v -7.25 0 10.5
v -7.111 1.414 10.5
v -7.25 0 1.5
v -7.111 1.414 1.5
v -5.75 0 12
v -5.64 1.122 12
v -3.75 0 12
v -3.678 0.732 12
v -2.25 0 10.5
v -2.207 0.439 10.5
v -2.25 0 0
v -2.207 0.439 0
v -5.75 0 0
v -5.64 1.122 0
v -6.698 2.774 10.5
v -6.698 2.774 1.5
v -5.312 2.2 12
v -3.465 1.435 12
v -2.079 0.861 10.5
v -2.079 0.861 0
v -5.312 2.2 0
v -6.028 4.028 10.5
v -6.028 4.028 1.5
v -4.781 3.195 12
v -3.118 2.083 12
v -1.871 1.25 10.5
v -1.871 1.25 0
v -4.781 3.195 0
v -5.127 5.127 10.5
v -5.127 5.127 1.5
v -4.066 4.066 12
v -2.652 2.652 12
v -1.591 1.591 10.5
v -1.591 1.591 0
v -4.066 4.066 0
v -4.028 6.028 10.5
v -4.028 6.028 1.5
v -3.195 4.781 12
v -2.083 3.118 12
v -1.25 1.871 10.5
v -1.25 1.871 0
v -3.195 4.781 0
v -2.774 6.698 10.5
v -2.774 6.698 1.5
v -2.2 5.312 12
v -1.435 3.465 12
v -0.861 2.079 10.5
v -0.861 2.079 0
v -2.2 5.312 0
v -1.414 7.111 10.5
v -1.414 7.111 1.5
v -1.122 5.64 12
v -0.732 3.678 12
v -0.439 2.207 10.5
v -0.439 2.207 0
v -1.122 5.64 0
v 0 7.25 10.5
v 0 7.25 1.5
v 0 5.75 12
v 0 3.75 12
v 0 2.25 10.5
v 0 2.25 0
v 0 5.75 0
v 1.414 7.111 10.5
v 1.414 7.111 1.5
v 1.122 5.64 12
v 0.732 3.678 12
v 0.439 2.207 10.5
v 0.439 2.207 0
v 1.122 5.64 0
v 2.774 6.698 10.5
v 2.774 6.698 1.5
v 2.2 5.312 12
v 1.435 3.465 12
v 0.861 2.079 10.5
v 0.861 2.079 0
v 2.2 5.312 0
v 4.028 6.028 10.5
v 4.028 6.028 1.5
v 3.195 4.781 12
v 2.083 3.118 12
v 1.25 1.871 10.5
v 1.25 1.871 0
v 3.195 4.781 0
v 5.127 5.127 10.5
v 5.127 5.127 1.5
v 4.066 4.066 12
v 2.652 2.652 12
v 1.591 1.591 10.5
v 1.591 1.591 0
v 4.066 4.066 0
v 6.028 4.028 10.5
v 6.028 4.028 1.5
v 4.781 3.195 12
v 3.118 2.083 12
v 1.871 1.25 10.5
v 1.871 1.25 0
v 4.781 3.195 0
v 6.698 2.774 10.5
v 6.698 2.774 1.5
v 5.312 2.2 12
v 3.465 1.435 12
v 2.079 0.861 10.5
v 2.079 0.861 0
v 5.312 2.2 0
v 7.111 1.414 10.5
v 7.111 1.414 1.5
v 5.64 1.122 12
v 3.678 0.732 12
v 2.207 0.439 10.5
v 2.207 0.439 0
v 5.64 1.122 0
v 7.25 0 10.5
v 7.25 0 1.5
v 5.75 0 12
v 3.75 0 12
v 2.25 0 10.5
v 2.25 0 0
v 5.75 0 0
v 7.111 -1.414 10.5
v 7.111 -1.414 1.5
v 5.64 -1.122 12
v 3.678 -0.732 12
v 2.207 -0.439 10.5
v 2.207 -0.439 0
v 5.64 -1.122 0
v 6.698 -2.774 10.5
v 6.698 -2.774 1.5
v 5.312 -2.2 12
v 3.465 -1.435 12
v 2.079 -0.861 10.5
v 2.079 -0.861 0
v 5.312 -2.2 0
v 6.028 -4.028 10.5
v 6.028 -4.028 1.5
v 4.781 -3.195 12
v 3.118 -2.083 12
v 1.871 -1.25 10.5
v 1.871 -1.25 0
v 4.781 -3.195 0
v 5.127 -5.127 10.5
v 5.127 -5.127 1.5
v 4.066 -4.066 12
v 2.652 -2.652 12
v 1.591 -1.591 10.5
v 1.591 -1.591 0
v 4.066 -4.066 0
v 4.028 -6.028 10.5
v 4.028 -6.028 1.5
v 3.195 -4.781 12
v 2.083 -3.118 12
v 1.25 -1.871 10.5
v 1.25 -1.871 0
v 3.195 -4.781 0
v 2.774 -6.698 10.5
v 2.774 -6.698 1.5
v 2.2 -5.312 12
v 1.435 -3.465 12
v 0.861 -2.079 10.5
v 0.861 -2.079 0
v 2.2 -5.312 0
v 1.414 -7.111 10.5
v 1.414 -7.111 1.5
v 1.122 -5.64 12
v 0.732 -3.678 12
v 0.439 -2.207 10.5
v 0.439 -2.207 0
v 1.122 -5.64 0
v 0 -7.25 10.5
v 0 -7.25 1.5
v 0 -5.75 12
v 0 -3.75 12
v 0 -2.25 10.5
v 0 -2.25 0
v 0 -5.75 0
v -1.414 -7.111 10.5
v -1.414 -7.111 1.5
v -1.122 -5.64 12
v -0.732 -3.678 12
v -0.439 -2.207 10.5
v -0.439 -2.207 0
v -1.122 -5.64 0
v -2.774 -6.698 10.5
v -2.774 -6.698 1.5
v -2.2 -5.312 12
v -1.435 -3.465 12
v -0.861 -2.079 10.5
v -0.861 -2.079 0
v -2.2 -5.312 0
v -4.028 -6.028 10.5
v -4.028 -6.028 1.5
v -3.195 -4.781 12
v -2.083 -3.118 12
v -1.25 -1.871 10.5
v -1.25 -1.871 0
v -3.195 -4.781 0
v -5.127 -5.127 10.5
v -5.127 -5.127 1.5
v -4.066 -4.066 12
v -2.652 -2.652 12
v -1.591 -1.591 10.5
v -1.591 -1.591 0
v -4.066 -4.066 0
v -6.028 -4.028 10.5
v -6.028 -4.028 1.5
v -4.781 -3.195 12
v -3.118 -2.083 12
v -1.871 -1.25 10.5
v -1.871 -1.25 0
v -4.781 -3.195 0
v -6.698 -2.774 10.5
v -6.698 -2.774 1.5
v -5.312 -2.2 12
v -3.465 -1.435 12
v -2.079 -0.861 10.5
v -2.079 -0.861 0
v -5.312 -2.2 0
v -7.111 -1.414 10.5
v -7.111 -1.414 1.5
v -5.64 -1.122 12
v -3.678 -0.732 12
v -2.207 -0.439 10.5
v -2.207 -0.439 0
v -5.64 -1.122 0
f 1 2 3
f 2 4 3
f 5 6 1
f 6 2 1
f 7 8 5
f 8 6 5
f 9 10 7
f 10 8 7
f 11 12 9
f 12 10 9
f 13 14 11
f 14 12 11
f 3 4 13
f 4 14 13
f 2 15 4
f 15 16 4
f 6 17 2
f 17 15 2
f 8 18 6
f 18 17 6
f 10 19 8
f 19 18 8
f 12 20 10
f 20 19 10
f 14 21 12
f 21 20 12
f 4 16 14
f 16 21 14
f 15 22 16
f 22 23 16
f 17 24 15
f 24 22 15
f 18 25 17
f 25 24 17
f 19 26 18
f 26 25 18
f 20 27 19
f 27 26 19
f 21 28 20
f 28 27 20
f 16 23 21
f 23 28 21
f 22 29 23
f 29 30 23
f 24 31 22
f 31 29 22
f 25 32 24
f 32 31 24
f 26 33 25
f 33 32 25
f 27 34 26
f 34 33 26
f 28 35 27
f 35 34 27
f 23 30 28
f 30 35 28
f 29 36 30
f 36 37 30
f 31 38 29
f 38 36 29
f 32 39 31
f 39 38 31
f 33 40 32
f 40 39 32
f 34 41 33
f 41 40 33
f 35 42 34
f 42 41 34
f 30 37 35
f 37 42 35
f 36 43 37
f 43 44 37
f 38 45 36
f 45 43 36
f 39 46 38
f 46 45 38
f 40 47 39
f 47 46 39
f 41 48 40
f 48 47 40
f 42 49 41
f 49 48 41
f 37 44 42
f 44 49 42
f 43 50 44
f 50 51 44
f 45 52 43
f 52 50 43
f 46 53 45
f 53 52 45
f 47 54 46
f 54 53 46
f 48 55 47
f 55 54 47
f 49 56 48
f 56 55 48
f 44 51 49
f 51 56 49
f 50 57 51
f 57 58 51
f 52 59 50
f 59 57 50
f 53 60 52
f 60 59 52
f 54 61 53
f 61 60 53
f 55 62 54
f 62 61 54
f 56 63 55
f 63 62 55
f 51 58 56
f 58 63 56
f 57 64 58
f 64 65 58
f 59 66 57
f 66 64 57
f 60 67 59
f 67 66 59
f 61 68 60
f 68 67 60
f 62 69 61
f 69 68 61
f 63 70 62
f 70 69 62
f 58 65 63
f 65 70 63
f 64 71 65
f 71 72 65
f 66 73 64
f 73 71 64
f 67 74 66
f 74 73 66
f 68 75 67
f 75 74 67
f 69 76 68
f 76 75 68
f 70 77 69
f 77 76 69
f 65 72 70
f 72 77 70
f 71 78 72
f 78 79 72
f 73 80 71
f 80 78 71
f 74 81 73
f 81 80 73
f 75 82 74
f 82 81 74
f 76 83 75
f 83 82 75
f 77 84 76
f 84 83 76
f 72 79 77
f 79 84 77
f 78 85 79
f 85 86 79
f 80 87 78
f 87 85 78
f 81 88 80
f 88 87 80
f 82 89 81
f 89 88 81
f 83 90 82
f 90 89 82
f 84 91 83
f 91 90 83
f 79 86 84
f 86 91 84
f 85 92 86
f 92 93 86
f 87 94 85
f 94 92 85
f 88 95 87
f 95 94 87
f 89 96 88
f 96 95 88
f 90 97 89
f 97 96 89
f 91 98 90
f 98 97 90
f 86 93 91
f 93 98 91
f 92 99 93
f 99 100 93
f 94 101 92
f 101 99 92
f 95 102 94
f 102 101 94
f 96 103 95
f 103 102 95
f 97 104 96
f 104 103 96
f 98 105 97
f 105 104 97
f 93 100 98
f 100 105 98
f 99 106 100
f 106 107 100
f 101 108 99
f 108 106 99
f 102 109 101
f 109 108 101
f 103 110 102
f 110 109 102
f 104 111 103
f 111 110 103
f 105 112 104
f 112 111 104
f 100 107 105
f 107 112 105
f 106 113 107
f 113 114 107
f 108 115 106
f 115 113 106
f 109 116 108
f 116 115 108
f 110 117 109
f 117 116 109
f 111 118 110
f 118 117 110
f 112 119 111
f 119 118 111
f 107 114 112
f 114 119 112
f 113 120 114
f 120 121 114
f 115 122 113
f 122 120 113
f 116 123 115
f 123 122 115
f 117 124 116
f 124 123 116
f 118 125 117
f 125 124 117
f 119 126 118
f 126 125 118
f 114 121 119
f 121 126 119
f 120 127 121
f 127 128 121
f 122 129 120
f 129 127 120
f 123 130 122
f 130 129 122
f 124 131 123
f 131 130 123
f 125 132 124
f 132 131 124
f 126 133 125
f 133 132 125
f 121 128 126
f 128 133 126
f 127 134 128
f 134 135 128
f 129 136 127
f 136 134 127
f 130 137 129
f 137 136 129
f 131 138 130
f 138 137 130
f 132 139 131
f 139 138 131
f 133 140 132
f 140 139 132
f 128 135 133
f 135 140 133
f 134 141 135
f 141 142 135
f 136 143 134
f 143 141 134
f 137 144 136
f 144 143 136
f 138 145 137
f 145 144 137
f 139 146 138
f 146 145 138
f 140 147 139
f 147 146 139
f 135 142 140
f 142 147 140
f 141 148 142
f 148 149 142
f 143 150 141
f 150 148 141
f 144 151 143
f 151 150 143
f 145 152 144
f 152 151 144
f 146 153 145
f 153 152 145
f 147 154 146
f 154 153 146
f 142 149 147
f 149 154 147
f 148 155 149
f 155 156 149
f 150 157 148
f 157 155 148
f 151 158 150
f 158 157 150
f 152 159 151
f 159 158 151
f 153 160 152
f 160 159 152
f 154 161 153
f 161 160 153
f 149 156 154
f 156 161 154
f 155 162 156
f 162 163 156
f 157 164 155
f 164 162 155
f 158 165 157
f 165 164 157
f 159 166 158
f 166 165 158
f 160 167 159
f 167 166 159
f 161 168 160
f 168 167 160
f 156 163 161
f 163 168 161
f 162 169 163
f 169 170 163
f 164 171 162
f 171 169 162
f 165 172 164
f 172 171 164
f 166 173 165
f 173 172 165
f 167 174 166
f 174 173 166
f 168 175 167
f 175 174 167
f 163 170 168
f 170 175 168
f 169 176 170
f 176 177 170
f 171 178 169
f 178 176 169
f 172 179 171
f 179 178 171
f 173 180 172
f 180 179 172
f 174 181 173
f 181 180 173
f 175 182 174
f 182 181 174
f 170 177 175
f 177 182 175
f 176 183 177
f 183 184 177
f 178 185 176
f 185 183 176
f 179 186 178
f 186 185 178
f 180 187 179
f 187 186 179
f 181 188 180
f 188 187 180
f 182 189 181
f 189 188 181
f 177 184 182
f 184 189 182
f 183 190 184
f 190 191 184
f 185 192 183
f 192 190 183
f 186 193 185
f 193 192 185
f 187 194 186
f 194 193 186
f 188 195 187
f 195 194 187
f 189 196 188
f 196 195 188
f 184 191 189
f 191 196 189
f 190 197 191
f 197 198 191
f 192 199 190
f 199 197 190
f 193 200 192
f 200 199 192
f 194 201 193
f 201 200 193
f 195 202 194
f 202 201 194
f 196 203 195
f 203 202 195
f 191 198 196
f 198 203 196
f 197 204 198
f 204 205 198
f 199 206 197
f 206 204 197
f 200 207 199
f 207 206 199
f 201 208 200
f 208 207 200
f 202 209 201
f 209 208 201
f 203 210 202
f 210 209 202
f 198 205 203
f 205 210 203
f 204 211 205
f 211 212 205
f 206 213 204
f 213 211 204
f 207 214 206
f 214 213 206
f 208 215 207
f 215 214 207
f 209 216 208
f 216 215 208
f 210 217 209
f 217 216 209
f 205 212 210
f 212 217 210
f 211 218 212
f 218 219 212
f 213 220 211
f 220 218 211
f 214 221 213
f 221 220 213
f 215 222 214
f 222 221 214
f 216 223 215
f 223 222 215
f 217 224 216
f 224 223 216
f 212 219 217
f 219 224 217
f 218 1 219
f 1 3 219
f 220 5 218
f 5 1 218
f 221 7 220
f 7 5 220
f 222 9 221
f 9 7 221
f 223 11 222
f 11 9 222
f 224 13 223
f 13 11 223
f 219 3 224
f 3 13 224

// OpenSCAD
$fn = 32;

// ----------------------------------------------------------------------
// Form washer: chamfered washer, 14.5 mm outside, 4.5 mm bore
// ----------------------------------------------------------------------

// --- parameters (mm) ---
revolve_angle = 360;      // full turn around the Z axis
profile_points = 7;       // points of the closed outline

profile = [[2.25, 0], [5.75, 0], [7.25, 1.5], [7.25, 10.5], [5.75, 12], [3.75, 12], [2.25, 10.5]];  // single closed polygon, 7 points, counter clockwise

// --- the one profile operation ---
rotate_extrude(angle = revolve_angle) polygon(points = profile);
